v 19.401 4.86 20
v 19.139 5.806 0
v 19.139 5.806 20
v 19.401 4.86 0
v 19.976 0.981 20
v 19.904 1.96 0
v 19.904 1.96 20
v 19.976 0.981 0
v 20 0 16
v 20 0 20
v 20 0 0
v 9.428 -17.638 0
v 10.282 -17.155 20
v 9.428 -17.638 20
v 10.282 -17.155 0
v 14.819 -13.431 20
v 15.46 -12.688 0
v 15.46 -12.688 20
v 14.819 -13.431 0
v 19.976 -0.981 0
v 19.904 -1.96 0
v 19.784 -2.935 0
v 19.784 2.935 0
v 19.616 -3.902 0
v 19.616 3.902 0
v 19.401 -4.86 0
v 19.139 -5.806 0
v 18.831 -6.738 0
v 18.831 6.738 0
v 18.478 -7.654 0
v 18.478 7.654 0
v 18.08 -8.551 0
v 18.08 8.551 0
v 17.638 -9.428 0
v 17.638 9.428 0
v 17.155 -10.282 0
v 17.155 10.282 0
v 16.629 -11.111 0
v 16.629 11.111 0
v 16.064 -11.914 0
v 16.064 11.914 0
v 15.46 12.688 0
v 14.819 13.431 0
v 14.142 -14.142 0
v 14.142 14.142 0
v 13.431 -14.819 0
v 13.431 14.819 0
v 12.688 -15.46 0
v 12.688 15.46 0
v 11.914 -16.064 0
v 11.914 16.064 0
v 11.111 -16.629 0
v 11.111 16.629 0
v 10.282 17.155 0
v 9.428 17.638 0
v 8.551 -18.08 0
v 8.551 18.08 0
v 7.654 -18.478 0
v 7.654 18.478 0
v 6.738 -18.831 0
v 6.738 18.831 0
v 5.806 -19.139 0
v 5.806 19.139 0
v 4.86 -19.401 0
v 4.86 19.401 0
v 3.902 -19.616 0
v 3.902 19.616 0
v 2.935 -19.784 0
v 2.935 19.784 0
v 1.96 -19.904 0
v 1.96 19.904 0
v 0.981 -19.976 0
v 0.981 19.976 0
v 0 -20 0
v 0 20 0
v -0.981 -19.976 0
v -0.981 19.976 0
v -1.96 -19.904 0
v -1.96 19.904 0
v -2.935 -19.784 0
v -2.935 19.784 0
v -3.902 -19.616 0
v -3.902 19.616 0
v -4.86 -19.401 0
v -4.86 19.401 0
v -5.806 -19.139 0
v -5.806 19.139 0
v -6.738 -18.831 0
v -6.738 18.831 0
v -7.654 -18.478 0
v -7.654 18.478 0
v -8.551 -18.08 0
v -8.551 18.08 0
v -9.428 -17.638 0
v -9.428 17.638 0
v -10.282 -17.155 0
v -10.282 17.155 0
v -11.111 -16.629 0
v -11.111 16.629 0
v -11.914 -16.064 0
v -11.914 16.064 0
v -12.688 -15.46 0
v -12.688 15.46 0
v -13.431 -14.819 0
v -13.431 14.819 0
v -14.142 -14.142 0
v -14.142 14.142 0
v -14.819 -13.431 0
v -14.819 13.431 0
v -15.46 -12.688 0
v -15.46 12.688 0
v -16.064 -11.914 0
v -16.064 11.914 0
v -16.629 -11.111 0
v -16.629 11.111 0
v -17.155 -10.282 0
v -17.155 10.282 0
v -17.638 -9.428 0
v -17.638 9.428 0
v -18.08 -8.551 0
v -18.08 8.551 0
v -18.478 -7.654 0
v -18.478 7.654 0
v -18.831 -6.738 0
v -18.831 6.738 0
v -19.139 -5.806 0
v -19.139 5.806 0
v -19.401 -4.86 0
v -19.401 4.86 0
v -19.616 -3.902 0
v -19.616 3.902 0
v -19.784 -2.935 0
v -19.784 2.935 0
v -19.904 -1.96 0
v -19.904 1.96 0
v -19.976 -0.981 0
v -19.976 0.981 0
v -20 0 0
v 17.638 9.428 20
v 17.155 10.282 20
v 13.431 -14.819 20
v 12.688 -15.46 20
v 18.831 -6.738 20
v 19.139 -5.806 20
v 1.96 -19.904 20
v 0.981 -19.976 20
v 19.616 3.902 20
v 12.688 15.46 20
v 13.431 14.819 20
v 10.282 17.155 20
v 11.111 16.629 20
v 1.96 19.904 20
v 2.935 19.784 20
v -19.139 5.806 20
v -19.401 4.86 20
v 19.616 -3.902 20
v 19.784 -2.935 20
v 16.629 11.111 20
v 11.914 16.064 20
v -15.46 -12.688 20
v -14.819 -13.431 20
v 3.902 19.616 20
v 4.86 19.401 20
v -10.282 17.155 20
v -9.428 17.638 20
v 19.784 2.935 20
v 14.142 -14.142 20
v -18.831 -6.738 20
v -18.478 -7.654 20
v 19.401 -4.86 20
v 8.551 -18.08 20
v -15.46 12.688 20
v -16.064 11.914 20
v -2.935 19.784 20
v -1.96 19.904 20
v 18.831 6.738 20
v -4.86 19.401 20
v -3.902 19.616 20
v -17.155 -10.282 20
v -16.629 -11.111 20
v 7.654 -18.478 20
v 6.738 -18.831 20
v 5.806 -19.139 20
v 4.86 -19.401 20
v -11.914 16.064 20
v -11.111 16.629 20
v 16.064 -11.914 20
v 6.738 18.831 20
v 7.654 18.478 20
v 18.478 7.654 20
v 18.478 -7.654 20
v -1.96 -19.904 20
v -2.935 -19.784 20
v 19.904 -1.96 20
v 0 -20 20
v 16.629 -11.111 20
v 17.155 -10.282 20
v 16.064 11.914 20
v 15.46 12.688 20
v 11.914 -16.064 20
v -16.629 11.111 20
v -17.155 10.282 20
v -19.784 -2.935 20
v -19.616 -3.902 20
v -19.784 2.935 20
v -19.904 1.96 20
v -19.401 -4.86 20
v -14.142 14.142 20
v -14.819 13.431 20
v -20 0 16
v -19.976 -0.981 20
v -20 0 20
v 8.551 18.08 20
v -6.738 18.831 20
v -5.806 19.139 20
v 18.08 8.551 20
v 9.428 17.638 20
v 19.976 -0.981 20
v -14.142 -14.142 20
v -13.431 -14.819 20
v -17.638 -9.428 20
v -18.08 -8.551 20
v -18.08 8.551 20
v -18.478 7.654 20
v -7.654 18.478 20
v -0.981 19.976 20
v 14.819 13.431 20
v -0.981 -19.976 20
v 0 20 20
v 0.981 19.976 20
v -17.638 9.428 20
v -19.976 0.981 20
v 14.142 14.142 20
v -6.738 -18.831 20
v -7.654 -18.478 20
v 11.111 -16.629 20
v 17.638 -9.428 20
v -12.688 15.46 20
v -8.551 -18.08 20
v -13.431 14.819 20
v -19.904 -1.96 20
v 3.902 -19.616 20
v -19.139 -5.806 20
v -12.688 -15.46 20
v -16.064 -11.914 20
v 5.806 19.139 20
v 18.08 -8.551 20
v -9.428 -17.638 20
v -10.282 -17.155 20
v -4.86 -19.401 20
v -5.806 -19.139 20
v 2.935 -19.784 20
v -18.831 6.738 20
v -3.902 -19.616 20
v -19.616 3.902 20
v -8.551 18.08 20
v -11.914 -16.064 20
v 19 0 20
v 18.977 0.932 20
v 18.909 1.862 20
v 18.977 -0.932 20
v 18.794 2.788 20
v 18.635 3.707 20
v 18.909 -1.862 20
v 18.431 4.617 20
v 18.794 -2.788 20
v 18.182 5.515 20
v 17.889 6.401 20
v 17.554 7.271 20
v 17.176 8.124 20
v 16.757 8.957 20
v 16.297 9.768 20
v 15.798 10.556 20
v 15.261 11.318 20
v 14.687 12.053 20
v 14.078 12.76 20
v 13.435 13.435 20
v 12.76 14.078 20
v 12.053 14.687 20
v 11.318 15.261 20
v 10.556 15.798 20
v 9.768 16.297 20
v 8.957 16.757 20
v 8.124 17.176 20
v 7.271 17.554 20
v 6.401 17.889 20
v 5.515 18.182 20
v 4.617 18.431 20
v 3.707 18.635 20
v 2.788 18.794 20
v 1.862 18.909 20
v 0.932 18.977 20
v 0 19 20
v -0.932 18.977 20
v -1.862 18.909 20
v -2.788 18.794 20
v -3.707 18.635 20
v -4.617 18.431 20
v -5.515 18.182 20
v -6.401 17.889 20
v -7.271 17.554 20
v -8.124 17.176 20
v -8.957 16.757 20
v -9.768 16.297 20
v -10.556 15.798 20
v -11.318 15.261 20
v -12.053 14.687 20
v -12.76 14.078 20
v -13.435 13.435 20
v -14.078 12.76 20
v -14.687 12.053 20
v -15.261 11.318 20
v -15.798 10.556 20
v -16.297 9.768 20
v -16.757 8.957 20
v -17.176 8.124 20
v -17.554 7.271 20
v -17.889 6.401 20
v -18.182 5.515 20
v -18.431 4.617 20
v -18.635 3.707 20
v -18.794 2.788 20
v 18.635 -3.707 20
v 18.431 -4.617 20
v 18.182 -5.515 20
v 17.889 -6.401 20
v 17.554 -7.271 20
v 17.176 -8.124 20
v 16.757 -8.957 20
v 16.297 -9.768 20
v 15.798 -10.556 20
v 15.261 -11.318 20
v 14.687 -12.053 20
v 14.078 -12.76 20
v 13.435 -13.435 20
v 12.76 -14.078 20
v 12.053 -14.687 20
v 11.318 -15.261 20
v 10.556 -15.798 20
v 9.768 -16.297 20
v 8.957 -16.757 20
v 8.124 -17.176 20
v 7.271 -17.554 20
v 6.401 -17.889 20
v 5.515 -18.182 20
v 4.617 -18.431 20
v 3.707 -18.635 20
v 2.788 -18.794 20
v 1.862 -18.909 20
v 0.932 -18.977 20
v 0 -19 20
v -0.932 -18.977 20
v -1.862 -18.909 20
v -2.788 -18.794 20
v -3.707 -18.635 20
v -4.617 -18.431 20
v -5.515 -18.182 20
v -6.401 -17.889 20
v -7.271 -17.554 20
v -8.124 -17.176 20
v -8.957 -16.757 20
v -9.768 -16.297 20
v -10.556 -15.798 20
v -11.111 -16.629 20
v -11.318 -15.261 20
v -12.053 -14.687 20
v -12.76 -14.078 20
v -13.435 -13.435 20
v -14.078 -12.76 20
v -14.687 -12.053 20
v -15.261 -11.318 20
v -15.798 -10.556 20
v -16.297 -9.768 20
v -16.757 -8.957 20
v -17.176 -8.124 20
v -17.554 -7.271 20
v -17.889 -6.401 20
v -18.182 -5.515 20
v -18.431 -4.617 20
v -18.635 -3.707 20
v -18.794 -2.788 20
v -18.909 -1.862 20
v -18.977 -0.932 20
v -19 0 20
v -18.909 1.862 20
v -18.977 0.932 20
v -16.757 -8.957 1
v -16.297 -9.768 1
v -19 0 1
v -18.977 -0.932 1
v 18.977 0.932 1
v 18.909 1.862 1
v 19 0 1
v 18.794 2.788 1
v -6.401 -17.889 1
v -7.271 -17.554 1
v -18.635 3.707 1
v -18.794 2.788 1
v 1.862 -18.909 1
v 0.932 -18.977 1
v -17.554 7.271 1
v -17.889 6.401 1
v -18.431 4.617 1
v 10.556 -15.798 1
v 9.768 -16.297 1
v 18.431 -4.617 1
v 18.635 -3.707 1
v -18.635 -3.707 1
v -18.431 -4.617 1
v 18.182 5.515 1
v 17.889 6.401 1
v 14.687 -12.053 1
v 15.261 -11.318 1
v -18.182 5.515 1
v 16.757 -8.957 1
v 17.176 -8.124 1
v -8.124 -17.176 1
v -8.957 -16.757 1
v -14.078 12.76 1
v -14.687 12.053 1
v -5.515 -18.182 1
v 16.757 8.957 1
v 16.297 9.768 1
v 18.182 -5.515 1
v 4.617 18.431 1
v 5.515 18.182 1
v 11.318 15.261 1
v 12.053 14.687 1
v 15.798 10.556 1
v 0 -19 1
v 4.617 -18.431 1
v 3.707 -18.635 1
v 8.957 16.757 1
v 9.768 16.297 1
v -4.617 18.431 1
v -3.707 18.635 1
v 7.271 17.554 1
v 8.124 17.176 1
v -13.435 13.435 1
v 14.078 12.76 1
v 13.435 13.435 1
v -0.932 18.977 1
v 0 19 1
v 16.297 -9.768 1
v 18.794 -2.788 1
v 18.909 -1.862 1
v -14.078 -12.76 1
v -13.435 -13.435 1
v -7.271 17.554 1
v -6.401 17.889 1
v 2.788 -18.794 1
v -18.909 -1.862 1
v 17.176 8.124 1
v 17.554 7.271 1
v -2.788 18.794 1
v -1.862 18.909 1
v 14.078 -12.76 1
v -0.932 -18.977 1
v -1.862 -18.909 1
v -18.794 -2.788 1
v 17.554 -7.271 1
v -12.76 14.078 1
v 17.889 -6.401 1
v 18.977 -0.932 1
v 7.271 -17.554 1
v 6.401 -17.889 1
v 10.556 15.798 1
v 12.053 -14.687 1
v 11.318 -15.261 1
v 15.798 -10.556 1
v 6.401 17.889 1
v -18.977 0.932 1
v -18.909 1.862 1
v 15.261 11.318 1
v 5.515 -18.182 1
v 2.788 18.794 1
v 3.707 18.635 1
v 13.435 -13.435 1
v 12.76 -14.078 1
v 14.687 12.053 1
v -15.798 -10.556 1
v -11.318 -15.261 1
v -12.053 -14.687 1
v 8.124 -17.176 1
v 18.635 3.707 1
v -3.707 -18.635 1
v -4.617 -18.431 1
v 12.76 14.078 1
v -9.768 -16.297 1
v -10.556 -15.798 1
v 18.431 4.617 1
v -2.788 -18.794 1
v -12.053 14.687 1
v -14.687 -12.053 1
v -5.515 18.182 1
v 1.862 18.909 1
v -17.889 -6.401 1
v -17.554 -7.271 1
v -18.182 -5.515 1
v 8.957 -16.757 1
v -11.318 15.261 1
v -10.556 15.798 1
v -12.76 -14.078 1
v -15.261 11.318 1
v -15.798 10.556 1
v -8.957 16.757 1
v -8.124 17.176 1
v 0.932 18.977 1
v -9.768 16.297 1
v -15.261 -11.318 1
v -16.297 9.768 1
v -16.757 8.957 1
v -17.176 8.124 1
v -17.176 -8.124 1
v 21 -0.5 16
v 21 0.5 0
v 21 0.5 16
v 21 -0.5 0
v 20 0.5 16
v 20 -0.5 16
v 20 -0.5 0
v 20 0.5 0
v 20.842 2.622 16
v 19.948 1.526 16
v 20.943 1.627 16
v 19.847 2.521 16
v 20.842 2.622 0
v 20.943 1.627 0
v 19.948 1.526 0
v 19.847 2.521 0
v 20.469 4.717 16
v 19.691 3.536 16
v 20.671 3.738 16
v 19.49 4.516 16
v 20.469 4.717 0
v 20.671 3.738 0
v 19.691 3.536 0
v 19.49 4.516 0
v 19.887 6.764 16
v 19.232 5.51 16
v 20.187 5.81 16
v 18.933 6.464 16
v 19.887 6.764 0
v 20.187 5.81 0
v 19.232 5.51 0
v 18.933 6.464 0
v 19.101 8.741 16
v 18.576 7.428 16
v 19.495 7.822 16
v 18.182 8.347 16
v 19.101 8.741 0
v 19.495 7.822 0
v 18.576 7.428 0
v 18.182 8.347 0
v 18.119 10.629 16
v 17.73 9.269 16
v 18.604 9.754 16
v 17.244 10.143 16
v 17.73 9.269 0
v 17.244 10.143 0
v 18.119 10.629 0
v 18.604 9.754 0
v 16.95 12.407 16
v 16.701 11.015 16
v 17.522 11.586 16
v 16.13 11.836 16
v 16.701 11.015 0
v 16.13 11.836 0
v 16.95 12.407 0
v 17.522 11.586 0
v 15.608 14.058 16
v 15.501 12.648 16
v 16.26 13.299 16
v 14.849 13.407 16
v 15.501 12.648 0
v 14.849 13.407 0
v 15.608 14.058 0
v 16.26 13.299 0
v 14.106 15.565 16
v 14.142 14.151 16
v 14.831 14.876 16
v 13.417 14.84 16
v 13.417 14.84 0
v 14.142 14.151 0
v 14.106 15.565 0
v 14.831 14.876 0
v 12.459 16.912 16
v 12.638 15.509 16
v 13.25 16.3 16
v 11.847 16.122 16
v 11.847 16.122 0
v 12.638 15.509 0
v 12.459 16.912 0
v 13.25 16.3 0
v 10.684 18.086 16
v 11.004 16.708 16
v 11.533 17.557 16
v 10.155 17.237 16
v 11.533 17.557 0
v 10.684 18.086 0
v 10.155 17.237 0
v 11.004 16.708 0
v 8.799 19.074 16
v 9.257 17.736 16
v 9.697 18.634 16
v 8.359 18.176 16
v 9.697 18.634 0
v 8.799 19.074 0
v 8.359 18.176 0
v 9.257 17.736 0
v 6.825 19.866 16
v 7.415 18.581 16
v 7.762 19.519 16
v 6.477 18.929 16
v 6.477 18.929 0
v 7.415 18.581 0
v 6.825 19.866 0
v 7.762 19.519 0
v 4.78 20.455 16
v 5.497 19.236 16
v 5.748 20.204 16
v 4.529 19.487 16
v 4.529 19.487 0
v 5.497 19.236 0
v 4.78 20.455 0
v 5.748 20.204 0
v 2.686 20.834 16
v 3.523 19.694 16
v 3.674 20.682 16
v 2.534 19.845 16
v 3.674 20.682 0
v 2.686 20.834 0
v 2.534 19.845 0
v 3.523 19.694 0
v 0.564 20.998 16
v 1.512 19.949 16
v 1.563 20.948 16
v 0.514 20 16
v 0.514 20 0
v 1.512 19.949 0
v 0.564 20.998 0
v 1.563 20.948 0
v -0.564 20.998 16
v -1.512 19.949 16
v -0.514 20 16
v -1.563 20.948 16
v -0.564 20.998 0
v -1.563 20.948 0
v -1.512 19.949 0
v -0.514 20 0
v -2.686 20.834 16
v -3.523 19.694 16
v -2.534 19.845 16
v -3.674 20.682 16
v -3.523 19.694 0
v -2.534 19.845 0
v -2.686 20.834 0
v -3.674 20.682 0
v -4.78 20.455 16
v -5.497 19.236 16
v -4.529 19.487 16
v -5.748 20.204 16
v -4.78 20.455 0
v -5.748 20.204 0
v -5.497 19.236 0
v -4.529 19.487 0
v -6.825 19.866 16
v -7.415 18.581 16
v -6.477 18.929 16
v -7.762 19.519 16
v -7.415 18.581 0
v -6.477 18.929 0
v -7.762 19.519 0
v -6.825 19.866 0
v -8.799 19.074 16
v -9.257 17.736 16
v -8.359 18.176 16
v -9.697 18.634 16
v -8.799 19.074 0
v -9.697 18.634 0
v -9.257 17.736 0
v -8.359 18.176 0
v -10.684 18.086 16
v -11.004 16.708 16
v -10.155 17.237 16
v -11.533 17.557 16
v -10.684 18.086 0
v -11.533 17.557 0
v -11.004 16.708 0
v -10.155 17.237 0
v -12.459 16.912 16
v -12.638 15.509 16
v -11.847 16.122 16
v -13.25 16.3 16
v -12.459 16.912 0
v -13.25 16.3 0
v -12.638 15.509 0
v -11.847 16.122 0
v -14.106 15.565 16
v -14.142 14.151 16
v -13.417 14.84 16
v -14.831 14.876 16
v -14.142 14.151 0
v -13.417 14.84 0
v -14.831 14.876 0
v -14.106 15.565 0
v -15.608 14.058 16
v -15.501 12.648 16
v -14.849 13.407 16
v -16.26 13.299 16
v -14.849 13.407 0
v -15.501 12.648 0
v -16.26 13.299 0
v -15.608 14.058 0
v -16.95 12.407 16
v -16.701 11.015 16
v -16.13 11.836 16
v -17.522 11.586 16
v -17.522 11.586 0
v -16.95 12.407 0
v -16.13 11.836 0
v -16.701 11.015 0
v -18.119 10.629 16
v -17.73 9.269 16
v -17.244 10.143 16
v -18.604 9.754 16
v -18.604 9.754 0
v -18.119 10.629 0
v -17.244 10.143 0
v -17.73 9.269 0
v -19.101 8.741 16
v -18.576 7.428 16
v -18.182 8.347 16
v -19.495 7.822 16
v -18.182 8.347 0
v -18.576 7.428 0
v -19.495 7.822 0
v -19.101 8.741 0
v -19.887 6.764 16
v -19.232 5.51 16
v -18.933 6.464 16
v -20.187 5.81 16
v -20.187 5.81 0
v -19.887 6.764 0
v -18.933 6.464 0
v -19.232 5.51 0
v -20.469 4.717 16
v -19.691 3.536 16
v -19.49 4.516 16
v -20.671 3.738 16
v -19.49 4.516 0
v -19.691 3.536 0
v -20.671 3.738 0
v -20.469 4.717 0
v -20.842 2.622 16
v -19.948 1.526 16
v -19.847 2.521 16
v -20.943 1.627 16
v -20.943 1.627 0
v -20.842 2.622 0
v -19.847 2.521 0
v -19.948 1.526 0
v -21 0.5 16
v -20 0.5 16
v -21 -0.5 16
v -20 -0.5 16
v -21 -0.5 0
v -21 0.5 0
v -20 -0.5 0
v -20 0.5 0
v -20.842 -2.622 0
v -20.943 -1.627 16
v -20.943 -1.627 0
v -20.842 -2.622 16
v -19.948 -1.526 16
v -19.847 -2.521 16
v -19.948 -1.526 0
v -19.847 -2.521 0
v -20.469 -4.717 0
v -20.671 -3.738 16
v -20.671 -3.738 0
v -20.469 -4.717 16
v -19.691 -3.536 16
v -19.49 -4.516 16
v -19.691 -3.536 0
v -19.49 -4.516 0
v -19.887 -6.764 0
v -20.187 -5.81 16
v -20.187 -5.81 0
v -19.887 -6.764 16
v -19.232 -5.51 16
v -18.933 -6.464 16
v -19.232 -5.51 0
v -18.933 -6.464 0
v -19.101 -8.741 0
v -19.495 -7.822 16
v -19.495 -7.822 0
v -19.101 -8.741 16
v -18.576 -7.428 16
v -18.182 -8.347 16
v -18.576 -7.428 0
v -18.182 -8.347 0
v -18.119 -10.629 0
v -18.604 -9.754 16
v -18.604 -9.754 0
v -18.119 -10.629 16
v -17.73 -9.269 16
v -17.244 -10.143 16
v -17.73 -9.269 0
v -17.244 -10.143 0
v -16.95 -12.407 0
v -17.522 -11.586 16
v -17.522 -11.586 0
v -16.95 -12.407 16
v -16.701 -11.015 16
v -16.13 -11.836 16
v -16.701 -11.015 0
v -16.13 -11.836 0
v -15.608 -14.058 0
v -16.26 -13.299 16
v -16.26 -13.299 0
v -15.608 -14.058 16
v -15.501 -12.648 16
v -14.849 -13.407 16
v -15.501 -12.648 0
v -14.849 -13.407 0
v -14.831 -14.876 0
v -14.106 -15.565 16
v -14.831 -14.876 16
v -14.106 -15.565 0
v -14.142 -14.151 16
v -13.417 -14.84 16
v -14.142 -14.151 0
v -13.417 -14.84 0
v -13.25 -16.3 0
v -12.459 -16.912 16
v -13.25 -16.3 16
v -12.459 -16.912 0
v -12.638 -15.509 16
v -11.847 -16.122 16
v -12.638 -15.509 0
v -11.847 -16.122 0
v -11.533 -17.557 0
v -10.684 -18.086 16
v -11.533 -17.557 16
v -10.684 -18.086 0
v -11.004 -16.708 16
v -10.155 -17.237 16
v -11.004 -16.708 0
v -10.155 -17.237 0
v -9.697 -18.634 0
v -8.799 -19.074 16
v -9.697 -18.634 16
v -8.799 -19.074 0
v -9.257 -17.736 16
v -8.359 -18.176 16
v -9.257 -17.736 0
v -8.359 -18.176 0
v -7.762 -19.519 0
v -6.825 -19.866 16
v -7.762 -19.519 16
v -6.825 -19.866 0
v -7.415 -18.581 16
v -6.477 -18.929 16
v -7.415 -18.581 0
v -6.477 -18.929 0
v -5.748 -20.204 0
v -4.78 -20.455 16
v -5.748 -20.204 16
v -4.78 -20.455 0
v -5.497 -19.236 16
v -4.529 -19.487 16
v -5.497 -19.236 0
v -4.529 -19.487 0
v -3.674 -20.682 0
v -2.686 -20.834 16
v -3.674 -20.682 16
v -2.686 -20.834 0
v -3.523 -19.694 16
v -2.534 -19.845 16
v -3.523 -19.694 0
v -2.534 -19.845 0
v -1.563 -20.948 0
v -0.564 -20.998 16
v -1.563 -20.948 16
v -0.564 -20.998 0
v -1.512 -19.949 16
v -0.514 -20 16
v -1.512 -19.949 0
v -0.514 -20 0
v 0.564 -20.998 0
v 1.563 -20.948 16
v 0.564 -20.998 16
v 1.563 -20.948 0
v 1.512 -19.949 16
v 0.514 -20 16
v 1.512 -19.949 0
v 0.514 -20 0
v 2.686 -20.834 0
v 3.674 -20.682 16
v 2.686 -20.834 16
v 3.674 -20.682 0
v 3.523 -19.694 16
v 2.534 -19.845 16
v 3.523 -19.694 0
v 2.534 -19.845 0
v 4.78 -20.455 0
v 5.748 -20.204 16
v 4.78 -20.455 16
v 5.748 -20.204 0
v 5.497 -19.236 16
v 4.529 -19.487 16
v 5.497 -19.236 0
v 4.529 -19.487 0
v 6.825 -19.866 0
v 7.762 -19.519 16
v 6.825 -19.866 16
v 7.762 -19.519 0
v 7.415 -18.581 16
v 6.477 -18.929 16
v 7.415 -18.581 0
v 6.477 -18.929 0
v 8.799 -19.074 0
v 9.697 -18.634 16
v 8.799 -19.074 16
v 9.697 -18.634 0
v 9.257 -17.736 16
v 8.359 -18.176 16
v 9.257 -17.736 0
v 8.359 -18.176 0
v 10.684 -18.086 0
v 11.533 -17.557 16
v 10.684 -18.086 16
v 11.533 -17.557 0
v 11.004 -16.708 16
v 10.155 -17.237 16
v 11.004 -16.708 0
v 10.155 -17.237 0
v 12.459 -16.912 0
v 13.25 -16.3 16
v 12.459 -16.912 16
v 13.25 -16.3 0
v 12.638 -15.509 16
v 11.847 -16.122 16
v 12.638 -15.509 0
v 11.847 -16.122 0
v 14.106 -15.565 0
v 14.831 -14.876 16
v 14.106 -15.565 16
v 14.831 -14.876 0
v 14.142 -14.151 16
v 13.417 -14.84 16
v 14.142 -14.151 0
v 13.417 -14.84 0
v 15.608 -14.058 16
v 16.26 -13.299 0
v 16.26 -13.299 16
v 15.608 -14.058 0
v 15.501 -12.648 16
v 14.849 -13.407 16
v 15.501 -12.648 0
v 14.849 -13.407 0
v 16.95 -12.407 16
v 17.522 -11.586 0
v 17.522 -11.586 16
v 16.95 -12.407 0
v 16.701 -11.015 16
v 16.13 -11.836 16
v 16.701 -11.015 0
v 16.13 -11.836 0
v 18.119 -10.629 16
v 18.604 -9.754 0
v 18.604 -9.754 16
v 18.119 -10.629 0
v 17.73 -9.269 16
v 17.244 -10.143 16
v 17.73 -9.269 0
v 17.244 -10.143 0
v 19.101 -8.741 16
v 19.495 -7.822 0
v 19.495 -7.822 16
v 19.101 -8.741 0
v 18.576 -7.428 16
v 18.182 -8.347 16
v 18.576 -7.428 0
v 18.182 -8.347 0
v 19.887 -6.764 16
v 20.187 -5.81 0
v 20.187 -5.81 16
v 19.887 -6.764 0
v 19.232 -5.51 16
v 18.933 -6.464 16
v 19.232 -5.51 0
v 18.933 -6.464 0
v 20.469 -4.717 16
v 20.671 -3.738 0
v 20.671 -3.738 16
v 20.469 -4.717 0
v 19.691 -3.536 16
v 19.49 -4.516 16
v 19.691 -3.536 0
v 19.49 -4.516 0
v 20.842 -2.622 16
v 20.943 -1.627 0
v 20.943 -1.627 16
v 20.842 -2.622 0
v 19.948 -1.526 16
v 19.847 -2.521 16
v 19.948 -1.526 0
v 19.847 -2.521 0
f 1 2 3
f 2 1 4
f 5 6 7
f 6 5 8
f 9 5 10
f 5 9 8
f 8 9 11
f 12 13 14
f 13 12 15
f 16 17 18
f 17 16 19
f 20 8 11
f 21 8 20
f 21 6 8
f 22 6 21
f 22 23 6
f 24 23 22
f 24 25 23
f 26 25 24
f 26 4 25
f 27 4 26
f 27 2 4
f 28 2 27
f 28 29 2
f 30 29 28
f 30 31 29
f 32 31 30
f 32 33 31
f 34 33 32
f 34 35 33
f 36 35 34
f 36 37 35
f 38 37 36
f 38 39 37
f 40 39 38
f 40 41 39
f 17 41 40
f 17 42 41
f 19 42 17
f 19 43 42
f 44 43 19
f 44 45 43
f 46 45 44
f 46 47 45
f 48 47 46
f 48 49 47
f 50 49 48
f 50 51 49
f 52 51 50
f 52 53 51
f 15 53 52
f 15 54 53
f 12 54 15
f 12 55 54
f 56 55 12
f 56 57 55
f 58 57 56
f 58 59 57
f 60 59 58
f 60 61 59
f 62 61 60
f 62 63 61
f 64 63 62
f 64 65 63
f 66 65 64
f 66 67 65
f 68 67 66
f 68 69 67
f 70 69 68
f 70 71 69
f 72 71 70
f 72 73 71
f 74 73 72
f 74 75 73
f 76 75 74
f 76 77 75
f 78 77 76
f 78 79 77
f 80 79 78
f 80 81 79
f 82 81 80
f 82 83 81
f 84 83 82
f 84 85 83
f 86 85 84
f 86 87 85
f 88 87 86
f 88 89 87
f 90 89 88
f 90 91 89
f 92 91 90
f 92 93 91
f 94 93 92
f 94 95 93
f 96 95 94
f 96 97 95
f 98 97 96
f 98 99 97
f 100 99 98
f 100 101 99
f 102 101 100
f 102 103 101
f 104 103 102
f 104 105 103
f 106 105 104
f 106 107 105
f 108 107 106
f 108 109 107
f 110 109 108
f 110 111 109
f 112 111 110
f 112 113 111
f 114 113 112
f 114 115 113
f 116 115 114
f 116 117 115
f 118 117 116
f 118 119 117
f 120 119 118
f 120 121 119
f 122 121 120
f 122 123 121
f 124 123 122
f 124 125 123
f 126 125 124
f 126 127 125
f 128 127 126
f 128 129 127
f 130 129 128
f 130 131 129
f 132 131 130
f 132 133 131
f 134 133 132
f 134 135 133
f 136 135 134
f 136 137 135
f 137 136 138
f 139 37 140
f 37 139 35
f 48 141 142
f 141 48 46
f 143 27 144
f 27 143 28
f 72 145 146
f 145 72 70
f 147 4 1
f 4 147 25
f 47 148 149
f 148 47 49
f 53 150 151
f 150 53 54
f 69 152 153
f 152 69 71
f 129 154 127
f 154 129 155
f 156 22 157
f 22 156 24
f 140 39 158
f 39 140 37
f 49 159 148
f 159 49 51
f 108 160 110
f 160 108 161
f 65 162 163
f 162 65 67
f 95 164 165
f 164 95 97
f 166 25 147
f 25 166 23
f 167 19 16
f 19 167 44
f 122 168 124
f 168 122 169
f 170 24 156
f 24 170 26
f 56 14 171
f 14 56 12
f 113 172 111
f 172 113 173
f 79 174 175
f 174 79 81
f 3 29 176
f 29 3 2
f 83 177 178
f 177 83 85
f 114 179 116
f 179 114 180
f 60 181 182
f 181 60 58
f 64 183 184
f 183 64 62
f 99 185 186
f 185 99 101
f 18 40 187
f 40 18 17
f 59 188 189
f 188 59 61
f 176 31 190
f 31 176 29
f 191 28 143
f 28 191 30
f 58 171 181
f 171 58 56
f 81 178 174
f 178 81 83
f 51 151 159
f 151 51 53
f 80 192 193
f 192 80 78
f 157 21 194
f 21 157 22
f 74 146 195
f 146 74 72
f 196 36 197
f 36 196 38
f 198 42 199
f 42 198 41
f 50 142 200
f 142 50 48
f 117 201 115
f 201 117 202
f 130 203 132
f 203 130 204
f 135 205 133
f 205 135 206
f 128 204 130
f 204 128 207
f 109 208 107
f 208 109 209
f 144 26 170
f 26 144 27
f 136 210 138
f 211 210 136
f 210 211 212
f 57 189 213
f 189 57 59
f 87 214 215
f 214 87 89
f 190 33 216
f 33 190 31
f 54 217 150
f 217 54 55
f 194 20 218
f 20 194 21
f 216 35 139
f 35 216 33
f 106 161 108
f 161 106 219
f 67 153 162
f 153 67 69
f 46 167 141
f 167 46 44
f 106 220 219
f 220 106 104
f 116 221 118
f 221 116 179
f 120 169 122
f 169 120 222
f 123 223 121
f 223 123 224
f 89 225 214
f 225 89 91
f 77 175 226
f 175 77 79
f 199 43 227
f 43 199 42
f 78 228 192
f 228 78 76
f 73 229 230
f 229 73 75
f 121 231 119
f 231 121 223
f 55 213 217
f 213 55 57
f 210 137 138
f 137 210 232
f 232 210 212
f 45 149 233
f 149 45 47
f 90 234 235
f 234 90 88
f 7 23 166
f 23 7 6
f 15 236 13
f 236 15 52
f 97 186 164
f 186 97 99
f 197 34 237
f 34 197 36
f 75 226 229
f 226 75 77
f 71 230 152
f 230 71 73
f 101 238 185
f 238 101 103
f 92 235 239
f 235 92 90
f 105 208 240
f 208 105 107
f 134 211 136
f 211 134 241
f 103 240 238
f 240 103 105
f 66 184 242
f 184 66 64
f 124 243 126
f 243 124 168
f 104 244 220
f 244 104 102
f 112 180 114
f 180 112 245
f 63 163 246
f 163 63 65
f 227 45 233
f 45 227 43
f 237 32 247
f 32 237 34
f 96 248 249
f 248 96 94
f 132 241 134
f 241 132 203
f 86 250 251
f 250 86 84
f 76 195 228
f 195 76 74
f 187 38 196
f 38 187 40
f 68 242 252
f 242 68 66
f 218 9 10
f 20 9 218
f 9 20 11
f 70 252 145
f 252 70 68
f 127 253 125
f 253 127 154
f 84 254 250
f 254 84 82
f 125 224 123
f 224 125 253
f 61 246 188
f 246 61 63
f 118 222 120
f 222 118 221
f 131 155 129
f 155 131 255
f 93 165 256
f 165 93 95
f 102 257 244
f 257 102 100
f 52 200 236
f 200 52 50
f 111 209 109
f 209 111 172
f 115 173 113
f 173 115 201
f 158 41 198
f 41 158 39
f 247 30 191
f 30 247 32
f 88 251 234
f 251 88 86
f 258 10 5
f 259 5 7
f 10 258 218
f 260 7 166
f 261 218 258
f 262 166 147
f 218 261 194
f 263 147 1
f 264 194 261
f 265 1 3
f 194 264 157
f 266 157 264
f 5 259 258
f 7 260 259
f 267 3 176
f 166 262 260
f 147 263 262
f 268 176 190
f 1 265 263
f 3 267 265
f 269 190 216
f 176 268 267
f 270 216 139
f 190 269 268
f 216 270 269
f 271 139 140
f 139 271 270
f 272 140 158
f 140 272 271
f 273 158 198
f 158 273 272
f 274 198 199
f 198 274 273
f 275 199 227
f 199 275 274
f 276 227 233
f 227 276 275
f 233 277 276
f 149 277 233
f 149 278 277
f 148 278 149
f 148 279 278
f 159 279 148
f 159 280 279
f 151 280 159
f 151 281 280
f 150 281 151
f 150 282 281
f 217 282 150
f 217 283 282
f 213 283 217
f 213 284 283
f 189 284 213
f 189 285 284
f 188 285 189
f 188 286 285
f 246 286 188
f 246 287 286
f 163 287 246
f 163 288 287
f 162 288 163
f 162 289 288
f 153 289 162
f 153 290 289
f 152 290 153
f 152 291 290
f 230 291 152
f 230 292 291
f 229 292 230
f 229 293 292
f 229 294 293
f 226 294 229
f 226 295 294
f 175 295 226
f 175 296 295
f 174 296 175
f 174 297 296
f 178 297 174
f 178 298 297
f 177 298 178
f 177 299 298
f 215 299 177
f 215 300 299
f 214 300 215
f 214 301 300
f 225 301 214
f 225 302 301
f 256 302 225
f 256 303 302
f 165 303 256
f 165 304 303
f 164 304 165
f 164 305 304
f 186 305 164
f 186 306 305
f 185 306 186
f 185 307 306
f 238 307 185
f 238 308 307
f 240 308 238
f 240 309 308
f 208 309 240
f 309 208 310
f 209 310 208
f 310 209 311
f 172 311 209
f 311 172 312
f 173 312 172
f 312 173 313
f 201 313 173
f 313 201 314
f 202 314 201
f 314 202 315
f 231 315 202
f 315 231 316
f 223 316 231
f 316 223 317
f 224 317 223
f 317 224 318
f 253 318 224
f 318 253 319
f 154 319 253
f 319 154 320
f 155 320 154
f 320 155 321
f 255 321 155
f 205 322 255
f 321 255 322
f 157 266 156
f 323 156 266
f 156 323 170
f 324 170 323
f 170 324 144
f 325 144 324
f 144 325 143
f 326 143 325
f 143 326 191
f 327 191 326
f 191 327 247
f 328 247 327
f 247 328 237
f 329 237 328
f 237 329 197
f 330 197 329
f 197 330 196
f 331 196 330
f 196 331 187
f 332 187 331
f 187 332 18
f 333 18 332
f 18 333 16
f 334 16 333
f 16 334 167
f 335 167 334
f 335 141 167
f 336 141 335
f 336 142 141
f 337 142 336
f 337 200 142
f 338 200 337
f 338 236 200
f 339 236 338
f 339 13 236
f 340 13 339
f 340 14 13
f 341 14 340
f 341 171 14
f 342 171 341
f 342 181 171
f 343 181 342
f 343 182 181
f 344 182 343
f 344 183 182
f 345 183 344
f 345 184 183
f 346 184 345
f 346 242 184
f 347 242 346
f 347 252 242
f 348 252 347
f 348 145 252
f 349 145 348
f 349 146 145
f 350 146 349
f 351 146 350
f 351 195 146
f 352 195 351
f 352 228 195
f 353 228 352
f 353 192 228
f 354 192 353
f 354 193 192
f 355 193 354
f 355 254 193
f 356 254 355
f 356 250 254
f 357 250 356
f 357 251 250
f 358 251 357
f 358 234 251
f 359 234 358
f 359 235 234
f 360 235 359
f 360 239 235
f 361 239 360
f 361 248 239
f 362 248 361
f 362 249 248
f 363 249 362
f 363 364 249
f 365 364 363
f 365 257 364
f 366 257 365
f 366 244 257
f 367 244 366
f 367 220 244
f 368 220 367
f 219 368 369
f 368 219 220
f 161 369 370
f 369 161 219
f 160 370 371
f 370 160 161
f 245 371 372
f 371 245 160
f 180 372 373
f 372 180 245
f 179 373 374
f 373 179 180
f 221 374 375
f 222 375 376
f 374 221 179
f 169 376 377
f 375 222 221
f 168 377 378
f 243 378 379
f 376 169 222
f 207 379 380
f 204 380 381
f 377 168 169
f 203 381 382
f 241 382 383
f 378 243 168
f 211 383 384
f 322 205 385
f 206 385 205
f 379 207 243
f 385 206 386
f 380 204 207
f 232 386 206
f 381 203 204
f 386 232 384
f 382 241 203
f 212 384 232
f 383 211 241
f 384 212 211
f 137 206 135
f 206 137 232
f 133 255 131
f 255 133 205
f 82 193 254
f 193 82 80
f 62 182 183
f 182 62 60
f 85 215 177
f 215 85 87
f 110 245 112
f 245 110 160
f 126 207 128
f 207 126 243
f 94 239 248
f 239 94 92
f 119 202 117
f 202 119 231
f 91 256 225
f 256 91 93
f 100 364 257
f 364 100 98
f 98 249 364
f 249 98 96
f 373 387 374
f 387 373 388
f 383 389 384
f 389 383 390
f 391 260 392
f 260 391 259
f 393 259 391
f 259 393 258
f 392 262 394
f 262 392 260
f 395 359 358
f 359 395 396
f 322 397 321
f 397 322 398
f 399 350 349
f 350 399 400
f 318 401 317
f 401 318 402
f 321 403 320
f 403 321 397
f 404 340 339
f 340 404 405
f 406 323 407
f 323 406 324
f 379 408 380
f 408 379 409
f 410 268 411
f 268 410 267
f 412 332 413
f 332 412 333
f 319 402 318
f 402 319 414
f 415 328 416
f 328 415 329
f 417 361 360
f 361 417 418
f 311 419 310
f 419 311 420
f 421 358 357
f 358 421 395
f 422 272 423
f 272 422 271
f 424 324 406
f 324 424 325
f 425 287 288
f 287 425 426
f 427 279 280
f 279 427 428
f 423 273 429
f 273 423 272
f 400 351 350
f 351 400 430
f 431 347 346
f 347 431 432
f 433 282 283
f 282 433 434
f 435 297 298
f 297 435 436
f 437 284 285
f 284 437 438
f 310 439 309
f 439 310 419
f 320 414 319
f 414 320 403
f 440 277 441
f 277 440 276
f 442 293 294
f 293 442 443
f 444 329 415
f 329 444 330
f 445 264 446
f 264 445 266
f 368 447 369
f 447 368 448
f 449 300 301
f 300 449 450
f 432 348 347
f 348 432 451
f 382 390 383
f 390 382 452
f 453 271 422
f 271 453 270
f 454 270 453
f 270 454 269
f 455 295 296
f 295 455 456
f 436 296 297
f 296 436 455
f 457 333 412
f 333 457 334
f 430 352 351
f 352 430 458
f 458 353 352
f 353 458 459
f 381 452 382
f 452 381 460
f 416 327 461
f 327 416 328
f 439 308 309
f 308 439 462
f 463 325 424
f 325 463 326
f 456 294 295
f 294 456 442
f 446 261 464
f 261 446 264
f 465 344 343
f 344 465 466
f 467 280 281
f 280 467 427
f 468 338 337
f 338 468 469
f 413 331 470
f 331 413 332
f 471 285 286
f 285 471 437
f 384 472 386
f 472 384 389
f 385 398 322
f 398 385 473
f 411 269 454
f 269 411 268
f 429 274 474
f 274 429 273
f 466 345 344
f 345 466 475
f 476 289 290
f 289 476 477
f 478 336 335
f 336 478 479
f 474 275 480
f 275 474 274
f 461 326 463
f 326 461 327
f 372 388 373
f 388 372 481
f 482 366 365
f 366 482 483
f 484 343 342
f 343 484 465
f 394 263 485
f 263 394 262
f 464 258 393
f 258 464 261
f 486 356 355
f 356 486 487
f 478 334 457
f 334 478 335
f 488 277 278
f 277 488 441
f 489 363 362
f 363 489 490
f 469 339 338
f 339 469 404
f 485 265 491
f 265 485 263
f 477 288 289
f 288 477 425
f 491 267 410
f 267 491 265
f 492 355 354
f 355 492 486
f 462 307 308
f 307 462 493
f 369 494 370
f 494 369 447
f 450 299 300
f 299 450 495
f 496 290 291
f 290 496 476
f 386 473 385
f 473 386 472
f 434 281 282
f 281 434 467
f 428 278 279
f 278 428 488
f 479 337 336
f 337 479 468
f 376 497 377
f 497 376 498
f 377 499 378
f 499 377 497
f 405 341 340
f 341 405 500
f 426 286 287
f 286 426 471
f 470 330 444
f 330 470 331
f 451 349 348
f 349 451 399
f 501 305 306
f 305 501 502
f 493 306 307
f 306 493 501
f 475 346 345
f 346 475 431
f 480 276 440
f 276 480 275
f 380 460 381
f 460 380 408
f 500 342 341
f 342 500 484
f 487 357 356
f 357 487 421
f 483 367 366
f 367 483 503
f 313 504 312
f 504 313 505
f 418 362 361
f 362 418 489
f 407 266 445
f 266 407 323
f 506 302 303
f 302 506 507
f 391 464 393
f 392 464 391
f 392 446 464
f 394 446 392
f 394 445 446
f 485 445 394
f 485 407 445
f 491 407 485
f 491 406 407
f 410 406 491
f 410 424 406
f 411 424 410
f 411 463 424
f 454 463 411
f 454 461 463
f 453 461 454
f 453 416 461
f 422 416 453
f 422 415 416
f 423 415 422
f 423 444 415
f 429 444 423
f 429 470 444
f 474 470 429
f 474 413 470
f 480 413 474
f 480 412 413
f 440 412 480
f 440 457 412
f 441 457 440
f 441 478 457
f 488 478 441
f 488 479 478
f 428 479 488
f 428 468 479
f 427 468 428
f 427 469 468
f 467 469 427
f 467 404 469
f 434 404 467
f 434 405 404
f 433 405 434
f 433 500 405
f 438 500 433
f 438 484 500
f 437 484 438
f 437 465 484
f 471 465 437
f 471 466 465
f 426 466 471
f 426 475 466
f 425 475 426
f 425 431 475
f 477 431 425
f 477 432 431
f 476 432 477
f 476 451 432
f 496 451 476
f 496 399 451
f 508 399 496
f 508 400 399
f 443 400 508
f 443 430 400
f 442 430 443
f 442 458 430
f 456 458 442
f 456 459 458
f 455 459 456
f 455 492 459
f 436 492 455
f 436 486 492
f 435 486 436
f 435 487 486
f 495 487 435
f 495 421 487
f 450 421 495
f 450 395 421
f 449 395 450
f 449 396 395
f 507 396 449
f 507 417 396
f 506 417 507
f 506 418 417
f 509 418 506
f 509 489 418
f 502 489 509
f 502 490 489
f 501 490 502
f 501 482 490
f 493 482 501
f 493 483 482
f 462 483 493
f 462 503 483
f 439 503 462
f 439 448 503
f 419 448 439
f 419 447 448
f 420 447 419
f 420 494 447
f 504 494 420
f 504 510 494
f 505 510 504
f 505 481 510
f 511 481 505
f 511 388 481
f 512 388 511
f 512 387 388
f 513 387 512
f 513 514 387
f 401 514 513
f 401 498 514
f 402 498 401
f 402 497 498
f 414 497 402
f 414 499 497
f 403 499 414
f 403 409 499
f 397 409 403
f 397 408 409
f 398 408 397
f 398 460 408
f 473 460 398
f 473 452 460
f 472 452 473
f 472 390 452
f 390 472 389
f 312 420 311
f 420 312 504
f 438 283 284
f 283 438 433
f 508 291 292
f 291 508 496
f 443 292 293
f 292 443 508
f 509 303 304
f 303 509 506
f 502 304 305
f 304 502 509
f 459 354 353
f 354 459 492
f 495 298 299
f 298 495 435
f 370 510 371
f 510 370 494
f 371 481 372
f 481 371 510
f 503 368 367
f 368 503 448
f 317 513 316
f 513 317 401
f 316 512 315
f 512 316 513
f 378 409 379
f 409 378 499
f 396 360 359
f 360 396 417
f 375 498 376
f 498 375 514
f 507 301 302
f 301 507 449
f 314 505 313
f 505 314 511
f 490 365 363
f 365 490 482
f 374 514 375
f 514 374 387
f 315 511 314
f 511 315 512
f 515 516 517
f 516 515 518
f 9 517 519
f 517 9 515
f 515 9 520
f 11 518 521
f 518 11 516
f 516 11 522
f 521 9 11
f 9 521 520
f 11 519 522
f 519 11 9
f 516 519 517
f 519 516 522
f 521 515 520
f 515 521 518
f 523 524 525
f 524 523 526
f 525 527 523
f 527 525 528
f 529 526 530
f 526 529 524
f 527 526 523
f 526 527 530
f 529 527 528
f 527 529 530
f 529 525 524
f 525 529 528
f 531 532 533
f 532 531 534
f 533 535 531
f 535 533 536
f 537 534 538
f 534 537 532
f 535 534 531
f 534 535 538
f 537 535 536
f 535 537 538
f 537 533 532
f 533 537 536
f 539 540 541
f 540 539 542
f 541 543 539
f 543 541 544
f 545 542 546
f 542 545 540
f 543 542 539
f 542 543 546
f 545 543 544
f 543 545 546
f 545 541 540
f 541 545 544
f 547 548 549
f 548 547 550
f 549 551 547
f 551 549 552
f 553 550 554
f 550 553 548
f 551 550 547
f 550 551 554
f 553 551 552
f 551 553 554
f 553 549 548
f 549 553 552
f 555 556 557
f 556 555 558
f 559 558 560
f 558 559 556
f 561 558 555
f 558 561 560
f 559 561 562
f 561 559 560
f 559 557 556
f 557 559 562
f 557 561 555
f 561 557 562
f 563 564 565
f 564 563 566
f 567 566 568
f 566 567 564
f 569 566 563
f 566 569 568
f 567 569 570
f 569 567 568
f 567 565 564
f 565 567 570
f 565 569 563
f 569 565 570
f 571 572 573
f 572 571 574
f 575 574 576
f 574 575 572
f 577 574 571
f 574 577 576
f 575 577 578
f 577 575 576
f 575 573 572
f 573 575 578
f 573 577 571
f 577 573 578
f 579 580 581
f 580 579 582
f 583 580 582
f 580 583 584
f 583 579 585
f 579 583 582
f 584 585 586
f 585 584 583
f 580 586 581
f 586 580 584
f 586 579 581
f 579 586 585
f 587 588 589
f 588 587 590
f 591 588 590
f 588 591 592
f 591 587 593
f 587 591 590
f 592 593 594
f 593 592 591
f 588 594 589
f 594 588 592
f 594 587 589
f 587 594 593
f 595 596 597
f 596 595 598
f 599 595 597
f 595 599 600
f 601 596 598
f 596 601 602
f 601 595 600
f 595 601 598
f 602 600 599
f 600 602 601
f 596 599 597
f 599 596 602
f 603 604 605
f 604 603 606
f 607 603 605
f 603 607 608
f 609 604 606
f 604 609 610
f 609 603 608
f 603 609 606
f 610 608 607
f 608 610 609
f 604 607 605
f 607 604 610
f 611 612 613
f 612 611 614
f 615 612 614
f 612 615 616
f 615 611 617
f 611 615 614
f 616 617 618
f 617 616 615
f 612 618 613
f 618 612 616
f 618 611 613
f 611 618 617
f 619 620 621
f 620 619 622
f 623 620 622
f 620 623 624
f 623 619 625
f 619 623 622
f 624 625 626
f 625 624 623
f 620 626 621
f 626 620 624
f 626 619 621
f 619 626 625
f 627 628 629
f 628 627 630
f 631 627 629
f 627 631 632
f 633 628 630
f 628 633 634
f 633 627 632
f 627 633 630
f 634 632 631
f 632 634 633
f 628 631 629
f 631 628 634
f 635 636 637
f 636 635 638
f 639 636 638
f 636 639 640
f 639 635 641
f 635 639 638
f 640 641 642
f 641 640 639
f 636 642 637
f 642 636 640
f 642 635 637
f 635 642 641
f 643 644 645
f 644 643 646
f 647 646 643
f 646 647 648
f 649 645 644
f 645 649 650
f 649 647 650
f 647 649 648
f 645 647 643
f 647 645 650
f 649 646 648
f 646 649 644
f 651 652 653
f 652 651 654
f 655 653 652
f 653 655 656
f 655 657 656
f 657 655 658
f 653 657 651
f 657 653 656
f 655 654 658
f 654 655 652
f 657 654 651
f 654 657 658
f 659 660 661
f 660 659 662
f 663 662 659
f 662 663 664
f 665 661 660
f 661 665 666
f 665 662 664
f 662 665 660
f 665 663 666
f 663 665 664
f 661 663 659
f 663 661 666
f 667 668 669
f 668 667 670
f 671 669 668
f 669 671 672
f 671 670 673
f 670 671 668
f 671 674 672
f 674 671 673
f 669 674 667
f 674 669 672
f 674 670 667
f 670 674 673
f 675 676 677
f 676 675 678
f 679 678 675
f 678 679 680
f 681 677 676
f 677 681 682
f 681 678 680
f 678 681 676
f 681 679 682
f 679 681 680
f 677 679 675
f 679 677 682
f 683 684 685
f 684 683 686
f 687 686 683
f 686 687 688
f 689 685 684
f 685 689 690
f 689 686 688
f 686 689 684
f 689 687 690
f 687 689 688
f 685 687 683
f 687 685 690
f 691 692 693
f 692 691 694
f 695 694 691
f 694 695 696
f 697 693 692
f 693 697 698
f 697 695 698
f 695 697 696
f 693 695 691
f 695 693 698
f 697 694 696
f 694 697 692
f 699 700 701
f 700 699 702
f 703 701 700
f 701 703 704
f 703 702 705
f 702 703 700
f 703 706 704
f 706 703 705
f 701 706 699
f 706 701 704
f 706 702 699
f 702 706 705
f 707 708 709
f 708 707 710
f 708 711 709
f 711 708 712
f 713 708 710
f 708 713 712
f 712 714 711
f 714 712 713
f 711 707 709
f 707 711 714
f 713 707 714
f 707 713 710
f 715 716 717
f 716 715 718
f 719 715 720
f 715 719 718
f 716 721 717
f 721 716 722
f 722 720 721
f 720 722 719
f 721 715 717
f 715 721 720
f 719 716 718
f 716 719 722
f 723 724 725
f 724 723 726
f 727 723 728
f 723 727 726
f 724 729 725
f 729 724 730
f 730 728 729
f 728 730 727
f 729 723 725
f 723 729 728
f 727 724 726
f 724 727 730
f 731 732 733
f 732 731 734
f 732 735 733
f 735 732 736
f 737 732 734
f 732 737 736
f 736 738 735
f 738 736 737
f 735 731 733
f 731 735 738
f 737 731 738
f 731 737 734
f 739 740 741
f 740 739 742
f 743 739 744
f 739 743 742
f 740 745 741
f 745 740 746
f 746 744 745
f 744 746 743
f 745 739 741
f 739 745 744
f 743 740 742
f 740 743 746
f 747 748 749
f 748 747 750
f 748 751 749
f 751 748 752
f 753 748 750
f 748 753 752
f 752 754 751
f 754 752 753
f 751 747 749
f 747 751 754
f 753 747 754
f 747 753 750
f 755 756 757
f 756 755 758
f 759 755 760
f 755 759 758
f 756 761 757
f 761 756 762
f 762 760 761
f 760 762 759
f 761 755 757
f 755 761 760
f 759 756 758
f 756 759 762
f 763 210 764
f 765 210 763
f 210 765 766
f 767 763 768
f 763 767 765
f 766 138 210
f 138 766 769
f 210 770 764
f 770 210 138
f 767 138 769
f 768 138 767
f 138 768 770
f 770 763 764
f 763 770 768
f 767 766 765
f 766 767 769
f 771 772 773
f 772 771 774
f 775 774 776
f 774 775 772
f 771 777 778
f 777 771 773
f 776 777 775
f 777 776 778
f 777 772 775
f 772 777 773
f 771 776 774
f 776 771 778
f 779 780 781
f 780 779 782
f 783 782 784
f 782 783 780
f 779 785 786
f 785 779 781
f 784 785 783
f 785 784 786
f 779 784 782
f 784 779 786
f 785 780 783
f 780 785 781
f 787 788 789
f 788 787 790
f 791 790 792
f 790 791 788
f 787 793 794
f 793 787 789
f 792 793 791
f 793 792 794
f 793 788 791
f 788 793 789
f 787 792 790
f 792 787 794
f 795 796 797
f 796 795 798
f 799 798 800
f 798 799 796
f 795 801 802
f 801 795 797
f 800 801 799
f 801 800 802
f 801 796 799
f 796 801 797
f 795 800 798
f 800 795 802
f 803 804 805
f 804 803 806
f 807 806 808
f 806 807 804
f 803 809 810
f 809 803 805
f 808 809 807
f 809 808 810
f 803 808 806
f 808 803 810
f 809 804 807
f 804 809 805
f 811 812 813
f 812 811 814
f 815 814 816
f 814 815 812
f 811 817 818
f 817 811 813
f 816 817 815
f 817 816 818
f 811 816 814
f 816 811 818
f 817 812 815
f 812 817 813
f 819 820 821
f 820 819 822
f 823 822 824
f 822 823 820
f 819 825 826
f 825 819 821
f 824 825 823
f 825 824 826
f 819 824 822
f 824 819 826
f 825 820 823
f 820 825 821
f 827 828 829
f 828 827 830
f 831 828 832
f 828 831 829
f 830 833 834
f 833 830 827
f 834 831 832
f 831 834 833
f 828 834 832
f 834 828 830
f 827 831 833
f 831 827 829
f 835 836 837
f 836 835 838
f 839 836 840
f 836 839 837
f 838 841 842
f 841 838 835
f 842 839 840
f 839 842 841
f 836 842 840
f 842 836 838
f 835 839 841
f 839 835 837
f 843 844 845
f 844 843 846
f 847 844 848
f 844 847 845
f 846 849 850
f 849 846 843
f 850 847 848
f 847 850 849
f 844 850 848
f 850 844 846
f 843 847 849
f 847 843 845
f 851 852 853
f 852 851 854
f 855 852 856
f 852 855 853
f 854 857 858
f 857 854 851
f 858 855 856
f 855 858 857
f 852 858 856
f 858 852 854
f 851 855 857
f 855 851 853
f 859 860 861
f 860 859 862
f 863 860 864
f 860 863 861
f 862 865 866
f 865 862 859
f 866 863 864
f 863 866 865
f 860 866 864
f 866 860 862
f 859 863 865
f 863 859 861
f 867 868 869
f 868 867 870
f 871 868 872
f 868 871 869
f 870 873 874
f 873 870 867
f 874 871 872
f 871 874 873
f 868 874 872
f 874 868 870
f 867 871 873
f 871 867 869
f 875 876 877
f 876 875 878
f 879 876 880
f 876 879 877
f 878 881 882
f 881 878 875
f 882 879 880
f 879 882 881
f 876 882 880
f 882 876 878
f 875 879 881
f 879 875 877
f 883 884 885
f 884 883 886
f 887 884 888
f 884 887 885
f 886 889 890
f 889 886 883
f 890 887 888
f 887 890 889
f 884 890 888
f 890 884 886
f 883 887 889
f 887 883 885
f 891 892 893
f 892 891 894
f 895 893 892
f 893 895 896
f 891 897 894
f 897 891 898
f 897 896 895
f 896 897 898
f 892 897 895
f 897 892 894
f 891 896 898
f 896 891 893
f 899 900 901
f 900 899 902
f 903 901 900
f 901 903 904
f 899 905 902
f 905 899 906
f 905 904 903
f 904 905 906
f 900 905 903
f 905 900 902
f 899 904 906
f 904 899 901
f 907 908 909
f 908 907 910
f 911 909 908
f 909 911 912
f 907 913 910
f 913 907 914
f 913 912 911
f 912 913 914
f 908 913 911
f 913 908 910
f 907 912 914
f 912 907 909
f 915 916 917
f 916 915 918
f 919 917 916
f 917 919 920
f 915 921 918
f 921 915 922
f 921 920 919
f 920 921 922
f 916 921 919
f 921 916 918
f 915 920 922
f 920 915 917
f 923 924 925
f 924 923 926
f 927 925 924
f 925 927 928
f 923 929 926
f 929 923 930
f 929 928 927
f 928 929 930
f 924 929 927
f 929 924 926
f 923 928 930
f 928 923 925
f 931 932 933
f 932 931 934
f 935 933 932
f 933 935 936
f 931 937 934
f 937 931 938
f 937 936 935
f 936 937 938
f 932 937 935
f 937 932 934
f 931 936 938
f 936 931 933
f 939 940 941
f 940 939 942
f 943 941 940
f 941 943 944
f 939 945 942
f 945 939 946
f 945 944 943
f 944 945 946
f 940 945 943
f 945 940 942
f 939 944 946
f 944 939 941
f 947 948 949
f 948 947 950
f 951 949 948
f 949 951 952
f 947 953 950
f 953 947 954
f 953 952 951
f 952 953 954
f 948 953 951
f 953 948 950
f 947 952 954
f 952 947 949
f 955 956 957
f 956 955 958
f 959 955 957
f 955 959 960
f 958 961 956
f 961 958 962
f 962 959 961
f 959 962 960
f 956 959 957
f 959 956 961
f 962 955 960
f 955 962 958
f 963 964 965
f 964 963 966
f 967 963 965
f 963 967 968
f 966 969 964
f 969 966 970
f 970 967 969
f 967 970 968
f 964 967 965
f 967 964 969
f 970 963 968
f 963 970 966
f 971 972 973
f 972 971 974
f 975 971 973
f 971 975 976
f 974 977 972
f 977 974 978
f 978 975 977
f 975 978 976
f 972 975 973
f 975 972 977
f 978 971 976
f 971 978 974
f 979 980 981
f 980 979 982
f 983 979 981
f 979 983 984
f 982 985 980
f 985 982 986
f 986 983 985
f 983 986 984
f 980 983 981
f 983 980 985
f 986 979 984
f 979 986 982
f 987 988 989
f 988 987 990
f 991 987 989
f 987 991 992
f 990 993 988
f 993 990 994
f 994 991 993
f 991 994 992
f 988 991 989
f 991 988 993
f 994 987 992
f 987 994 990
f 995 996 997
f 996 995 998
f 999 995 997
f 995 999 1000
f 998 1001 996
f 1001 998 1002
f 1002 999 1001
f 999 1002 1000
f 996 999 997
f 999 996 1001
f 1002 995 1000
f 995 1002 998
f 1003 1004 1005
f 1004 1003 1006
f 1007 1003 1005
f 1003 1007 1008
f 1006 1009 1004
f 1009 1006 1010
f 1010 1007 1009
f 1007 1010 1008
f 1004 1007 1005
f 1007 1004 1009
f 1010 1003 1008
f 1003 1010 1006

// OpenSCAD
// ------------------ Parameters ------------------
outer_radius = 20;          // mm
wall_thickness = 1;         // mm
bar_thickness = 1;          // mm (radial)
bar_width = 1;              // mm (circumferential)
bar_gap = 1;                // mm
height = 20;                // mm

bottom_thickness = 1;       // mm (solid bottom)
top_clearance = 4;          // mm (no bars at top)

// smooth corners
$fn = 128;

// ------------------ Main ------------------
union() {
    hollow_cylinder();
    external_bars();
}

// ------------------ Hollow Cylinder ------------------
module hollow_cylinder() {
    difference() {
        // Outer shell
        cylinder(r = outer_radius, h = height);

        // Inner hollow (raised to leave solid bottom)
        translate([0, 0, bottom_thickness])
            cylinder(
                r = outer_radius - wall_thickness,
                h = height - bottom_thickness + 0.01
            );
    }
}

// ------------------ External Bars ------------------
module external_bars() {
    circumference = 2 * PI * outer_radius;
    bar_pitch = bar_width + bar_gap;
    bar_count = floor(circumference / bar_pitch);

    for (i = [0 : bar_count - 1]) {
        angle = i * 360 / bar_count;
        rotate([0, 0, angle])
            translate([outer_radius, -bar_width/2, 0])
                cube([
                    bar_thickness,
                    bar_width,
                    height - top_clearance
                ]);
    }
}
